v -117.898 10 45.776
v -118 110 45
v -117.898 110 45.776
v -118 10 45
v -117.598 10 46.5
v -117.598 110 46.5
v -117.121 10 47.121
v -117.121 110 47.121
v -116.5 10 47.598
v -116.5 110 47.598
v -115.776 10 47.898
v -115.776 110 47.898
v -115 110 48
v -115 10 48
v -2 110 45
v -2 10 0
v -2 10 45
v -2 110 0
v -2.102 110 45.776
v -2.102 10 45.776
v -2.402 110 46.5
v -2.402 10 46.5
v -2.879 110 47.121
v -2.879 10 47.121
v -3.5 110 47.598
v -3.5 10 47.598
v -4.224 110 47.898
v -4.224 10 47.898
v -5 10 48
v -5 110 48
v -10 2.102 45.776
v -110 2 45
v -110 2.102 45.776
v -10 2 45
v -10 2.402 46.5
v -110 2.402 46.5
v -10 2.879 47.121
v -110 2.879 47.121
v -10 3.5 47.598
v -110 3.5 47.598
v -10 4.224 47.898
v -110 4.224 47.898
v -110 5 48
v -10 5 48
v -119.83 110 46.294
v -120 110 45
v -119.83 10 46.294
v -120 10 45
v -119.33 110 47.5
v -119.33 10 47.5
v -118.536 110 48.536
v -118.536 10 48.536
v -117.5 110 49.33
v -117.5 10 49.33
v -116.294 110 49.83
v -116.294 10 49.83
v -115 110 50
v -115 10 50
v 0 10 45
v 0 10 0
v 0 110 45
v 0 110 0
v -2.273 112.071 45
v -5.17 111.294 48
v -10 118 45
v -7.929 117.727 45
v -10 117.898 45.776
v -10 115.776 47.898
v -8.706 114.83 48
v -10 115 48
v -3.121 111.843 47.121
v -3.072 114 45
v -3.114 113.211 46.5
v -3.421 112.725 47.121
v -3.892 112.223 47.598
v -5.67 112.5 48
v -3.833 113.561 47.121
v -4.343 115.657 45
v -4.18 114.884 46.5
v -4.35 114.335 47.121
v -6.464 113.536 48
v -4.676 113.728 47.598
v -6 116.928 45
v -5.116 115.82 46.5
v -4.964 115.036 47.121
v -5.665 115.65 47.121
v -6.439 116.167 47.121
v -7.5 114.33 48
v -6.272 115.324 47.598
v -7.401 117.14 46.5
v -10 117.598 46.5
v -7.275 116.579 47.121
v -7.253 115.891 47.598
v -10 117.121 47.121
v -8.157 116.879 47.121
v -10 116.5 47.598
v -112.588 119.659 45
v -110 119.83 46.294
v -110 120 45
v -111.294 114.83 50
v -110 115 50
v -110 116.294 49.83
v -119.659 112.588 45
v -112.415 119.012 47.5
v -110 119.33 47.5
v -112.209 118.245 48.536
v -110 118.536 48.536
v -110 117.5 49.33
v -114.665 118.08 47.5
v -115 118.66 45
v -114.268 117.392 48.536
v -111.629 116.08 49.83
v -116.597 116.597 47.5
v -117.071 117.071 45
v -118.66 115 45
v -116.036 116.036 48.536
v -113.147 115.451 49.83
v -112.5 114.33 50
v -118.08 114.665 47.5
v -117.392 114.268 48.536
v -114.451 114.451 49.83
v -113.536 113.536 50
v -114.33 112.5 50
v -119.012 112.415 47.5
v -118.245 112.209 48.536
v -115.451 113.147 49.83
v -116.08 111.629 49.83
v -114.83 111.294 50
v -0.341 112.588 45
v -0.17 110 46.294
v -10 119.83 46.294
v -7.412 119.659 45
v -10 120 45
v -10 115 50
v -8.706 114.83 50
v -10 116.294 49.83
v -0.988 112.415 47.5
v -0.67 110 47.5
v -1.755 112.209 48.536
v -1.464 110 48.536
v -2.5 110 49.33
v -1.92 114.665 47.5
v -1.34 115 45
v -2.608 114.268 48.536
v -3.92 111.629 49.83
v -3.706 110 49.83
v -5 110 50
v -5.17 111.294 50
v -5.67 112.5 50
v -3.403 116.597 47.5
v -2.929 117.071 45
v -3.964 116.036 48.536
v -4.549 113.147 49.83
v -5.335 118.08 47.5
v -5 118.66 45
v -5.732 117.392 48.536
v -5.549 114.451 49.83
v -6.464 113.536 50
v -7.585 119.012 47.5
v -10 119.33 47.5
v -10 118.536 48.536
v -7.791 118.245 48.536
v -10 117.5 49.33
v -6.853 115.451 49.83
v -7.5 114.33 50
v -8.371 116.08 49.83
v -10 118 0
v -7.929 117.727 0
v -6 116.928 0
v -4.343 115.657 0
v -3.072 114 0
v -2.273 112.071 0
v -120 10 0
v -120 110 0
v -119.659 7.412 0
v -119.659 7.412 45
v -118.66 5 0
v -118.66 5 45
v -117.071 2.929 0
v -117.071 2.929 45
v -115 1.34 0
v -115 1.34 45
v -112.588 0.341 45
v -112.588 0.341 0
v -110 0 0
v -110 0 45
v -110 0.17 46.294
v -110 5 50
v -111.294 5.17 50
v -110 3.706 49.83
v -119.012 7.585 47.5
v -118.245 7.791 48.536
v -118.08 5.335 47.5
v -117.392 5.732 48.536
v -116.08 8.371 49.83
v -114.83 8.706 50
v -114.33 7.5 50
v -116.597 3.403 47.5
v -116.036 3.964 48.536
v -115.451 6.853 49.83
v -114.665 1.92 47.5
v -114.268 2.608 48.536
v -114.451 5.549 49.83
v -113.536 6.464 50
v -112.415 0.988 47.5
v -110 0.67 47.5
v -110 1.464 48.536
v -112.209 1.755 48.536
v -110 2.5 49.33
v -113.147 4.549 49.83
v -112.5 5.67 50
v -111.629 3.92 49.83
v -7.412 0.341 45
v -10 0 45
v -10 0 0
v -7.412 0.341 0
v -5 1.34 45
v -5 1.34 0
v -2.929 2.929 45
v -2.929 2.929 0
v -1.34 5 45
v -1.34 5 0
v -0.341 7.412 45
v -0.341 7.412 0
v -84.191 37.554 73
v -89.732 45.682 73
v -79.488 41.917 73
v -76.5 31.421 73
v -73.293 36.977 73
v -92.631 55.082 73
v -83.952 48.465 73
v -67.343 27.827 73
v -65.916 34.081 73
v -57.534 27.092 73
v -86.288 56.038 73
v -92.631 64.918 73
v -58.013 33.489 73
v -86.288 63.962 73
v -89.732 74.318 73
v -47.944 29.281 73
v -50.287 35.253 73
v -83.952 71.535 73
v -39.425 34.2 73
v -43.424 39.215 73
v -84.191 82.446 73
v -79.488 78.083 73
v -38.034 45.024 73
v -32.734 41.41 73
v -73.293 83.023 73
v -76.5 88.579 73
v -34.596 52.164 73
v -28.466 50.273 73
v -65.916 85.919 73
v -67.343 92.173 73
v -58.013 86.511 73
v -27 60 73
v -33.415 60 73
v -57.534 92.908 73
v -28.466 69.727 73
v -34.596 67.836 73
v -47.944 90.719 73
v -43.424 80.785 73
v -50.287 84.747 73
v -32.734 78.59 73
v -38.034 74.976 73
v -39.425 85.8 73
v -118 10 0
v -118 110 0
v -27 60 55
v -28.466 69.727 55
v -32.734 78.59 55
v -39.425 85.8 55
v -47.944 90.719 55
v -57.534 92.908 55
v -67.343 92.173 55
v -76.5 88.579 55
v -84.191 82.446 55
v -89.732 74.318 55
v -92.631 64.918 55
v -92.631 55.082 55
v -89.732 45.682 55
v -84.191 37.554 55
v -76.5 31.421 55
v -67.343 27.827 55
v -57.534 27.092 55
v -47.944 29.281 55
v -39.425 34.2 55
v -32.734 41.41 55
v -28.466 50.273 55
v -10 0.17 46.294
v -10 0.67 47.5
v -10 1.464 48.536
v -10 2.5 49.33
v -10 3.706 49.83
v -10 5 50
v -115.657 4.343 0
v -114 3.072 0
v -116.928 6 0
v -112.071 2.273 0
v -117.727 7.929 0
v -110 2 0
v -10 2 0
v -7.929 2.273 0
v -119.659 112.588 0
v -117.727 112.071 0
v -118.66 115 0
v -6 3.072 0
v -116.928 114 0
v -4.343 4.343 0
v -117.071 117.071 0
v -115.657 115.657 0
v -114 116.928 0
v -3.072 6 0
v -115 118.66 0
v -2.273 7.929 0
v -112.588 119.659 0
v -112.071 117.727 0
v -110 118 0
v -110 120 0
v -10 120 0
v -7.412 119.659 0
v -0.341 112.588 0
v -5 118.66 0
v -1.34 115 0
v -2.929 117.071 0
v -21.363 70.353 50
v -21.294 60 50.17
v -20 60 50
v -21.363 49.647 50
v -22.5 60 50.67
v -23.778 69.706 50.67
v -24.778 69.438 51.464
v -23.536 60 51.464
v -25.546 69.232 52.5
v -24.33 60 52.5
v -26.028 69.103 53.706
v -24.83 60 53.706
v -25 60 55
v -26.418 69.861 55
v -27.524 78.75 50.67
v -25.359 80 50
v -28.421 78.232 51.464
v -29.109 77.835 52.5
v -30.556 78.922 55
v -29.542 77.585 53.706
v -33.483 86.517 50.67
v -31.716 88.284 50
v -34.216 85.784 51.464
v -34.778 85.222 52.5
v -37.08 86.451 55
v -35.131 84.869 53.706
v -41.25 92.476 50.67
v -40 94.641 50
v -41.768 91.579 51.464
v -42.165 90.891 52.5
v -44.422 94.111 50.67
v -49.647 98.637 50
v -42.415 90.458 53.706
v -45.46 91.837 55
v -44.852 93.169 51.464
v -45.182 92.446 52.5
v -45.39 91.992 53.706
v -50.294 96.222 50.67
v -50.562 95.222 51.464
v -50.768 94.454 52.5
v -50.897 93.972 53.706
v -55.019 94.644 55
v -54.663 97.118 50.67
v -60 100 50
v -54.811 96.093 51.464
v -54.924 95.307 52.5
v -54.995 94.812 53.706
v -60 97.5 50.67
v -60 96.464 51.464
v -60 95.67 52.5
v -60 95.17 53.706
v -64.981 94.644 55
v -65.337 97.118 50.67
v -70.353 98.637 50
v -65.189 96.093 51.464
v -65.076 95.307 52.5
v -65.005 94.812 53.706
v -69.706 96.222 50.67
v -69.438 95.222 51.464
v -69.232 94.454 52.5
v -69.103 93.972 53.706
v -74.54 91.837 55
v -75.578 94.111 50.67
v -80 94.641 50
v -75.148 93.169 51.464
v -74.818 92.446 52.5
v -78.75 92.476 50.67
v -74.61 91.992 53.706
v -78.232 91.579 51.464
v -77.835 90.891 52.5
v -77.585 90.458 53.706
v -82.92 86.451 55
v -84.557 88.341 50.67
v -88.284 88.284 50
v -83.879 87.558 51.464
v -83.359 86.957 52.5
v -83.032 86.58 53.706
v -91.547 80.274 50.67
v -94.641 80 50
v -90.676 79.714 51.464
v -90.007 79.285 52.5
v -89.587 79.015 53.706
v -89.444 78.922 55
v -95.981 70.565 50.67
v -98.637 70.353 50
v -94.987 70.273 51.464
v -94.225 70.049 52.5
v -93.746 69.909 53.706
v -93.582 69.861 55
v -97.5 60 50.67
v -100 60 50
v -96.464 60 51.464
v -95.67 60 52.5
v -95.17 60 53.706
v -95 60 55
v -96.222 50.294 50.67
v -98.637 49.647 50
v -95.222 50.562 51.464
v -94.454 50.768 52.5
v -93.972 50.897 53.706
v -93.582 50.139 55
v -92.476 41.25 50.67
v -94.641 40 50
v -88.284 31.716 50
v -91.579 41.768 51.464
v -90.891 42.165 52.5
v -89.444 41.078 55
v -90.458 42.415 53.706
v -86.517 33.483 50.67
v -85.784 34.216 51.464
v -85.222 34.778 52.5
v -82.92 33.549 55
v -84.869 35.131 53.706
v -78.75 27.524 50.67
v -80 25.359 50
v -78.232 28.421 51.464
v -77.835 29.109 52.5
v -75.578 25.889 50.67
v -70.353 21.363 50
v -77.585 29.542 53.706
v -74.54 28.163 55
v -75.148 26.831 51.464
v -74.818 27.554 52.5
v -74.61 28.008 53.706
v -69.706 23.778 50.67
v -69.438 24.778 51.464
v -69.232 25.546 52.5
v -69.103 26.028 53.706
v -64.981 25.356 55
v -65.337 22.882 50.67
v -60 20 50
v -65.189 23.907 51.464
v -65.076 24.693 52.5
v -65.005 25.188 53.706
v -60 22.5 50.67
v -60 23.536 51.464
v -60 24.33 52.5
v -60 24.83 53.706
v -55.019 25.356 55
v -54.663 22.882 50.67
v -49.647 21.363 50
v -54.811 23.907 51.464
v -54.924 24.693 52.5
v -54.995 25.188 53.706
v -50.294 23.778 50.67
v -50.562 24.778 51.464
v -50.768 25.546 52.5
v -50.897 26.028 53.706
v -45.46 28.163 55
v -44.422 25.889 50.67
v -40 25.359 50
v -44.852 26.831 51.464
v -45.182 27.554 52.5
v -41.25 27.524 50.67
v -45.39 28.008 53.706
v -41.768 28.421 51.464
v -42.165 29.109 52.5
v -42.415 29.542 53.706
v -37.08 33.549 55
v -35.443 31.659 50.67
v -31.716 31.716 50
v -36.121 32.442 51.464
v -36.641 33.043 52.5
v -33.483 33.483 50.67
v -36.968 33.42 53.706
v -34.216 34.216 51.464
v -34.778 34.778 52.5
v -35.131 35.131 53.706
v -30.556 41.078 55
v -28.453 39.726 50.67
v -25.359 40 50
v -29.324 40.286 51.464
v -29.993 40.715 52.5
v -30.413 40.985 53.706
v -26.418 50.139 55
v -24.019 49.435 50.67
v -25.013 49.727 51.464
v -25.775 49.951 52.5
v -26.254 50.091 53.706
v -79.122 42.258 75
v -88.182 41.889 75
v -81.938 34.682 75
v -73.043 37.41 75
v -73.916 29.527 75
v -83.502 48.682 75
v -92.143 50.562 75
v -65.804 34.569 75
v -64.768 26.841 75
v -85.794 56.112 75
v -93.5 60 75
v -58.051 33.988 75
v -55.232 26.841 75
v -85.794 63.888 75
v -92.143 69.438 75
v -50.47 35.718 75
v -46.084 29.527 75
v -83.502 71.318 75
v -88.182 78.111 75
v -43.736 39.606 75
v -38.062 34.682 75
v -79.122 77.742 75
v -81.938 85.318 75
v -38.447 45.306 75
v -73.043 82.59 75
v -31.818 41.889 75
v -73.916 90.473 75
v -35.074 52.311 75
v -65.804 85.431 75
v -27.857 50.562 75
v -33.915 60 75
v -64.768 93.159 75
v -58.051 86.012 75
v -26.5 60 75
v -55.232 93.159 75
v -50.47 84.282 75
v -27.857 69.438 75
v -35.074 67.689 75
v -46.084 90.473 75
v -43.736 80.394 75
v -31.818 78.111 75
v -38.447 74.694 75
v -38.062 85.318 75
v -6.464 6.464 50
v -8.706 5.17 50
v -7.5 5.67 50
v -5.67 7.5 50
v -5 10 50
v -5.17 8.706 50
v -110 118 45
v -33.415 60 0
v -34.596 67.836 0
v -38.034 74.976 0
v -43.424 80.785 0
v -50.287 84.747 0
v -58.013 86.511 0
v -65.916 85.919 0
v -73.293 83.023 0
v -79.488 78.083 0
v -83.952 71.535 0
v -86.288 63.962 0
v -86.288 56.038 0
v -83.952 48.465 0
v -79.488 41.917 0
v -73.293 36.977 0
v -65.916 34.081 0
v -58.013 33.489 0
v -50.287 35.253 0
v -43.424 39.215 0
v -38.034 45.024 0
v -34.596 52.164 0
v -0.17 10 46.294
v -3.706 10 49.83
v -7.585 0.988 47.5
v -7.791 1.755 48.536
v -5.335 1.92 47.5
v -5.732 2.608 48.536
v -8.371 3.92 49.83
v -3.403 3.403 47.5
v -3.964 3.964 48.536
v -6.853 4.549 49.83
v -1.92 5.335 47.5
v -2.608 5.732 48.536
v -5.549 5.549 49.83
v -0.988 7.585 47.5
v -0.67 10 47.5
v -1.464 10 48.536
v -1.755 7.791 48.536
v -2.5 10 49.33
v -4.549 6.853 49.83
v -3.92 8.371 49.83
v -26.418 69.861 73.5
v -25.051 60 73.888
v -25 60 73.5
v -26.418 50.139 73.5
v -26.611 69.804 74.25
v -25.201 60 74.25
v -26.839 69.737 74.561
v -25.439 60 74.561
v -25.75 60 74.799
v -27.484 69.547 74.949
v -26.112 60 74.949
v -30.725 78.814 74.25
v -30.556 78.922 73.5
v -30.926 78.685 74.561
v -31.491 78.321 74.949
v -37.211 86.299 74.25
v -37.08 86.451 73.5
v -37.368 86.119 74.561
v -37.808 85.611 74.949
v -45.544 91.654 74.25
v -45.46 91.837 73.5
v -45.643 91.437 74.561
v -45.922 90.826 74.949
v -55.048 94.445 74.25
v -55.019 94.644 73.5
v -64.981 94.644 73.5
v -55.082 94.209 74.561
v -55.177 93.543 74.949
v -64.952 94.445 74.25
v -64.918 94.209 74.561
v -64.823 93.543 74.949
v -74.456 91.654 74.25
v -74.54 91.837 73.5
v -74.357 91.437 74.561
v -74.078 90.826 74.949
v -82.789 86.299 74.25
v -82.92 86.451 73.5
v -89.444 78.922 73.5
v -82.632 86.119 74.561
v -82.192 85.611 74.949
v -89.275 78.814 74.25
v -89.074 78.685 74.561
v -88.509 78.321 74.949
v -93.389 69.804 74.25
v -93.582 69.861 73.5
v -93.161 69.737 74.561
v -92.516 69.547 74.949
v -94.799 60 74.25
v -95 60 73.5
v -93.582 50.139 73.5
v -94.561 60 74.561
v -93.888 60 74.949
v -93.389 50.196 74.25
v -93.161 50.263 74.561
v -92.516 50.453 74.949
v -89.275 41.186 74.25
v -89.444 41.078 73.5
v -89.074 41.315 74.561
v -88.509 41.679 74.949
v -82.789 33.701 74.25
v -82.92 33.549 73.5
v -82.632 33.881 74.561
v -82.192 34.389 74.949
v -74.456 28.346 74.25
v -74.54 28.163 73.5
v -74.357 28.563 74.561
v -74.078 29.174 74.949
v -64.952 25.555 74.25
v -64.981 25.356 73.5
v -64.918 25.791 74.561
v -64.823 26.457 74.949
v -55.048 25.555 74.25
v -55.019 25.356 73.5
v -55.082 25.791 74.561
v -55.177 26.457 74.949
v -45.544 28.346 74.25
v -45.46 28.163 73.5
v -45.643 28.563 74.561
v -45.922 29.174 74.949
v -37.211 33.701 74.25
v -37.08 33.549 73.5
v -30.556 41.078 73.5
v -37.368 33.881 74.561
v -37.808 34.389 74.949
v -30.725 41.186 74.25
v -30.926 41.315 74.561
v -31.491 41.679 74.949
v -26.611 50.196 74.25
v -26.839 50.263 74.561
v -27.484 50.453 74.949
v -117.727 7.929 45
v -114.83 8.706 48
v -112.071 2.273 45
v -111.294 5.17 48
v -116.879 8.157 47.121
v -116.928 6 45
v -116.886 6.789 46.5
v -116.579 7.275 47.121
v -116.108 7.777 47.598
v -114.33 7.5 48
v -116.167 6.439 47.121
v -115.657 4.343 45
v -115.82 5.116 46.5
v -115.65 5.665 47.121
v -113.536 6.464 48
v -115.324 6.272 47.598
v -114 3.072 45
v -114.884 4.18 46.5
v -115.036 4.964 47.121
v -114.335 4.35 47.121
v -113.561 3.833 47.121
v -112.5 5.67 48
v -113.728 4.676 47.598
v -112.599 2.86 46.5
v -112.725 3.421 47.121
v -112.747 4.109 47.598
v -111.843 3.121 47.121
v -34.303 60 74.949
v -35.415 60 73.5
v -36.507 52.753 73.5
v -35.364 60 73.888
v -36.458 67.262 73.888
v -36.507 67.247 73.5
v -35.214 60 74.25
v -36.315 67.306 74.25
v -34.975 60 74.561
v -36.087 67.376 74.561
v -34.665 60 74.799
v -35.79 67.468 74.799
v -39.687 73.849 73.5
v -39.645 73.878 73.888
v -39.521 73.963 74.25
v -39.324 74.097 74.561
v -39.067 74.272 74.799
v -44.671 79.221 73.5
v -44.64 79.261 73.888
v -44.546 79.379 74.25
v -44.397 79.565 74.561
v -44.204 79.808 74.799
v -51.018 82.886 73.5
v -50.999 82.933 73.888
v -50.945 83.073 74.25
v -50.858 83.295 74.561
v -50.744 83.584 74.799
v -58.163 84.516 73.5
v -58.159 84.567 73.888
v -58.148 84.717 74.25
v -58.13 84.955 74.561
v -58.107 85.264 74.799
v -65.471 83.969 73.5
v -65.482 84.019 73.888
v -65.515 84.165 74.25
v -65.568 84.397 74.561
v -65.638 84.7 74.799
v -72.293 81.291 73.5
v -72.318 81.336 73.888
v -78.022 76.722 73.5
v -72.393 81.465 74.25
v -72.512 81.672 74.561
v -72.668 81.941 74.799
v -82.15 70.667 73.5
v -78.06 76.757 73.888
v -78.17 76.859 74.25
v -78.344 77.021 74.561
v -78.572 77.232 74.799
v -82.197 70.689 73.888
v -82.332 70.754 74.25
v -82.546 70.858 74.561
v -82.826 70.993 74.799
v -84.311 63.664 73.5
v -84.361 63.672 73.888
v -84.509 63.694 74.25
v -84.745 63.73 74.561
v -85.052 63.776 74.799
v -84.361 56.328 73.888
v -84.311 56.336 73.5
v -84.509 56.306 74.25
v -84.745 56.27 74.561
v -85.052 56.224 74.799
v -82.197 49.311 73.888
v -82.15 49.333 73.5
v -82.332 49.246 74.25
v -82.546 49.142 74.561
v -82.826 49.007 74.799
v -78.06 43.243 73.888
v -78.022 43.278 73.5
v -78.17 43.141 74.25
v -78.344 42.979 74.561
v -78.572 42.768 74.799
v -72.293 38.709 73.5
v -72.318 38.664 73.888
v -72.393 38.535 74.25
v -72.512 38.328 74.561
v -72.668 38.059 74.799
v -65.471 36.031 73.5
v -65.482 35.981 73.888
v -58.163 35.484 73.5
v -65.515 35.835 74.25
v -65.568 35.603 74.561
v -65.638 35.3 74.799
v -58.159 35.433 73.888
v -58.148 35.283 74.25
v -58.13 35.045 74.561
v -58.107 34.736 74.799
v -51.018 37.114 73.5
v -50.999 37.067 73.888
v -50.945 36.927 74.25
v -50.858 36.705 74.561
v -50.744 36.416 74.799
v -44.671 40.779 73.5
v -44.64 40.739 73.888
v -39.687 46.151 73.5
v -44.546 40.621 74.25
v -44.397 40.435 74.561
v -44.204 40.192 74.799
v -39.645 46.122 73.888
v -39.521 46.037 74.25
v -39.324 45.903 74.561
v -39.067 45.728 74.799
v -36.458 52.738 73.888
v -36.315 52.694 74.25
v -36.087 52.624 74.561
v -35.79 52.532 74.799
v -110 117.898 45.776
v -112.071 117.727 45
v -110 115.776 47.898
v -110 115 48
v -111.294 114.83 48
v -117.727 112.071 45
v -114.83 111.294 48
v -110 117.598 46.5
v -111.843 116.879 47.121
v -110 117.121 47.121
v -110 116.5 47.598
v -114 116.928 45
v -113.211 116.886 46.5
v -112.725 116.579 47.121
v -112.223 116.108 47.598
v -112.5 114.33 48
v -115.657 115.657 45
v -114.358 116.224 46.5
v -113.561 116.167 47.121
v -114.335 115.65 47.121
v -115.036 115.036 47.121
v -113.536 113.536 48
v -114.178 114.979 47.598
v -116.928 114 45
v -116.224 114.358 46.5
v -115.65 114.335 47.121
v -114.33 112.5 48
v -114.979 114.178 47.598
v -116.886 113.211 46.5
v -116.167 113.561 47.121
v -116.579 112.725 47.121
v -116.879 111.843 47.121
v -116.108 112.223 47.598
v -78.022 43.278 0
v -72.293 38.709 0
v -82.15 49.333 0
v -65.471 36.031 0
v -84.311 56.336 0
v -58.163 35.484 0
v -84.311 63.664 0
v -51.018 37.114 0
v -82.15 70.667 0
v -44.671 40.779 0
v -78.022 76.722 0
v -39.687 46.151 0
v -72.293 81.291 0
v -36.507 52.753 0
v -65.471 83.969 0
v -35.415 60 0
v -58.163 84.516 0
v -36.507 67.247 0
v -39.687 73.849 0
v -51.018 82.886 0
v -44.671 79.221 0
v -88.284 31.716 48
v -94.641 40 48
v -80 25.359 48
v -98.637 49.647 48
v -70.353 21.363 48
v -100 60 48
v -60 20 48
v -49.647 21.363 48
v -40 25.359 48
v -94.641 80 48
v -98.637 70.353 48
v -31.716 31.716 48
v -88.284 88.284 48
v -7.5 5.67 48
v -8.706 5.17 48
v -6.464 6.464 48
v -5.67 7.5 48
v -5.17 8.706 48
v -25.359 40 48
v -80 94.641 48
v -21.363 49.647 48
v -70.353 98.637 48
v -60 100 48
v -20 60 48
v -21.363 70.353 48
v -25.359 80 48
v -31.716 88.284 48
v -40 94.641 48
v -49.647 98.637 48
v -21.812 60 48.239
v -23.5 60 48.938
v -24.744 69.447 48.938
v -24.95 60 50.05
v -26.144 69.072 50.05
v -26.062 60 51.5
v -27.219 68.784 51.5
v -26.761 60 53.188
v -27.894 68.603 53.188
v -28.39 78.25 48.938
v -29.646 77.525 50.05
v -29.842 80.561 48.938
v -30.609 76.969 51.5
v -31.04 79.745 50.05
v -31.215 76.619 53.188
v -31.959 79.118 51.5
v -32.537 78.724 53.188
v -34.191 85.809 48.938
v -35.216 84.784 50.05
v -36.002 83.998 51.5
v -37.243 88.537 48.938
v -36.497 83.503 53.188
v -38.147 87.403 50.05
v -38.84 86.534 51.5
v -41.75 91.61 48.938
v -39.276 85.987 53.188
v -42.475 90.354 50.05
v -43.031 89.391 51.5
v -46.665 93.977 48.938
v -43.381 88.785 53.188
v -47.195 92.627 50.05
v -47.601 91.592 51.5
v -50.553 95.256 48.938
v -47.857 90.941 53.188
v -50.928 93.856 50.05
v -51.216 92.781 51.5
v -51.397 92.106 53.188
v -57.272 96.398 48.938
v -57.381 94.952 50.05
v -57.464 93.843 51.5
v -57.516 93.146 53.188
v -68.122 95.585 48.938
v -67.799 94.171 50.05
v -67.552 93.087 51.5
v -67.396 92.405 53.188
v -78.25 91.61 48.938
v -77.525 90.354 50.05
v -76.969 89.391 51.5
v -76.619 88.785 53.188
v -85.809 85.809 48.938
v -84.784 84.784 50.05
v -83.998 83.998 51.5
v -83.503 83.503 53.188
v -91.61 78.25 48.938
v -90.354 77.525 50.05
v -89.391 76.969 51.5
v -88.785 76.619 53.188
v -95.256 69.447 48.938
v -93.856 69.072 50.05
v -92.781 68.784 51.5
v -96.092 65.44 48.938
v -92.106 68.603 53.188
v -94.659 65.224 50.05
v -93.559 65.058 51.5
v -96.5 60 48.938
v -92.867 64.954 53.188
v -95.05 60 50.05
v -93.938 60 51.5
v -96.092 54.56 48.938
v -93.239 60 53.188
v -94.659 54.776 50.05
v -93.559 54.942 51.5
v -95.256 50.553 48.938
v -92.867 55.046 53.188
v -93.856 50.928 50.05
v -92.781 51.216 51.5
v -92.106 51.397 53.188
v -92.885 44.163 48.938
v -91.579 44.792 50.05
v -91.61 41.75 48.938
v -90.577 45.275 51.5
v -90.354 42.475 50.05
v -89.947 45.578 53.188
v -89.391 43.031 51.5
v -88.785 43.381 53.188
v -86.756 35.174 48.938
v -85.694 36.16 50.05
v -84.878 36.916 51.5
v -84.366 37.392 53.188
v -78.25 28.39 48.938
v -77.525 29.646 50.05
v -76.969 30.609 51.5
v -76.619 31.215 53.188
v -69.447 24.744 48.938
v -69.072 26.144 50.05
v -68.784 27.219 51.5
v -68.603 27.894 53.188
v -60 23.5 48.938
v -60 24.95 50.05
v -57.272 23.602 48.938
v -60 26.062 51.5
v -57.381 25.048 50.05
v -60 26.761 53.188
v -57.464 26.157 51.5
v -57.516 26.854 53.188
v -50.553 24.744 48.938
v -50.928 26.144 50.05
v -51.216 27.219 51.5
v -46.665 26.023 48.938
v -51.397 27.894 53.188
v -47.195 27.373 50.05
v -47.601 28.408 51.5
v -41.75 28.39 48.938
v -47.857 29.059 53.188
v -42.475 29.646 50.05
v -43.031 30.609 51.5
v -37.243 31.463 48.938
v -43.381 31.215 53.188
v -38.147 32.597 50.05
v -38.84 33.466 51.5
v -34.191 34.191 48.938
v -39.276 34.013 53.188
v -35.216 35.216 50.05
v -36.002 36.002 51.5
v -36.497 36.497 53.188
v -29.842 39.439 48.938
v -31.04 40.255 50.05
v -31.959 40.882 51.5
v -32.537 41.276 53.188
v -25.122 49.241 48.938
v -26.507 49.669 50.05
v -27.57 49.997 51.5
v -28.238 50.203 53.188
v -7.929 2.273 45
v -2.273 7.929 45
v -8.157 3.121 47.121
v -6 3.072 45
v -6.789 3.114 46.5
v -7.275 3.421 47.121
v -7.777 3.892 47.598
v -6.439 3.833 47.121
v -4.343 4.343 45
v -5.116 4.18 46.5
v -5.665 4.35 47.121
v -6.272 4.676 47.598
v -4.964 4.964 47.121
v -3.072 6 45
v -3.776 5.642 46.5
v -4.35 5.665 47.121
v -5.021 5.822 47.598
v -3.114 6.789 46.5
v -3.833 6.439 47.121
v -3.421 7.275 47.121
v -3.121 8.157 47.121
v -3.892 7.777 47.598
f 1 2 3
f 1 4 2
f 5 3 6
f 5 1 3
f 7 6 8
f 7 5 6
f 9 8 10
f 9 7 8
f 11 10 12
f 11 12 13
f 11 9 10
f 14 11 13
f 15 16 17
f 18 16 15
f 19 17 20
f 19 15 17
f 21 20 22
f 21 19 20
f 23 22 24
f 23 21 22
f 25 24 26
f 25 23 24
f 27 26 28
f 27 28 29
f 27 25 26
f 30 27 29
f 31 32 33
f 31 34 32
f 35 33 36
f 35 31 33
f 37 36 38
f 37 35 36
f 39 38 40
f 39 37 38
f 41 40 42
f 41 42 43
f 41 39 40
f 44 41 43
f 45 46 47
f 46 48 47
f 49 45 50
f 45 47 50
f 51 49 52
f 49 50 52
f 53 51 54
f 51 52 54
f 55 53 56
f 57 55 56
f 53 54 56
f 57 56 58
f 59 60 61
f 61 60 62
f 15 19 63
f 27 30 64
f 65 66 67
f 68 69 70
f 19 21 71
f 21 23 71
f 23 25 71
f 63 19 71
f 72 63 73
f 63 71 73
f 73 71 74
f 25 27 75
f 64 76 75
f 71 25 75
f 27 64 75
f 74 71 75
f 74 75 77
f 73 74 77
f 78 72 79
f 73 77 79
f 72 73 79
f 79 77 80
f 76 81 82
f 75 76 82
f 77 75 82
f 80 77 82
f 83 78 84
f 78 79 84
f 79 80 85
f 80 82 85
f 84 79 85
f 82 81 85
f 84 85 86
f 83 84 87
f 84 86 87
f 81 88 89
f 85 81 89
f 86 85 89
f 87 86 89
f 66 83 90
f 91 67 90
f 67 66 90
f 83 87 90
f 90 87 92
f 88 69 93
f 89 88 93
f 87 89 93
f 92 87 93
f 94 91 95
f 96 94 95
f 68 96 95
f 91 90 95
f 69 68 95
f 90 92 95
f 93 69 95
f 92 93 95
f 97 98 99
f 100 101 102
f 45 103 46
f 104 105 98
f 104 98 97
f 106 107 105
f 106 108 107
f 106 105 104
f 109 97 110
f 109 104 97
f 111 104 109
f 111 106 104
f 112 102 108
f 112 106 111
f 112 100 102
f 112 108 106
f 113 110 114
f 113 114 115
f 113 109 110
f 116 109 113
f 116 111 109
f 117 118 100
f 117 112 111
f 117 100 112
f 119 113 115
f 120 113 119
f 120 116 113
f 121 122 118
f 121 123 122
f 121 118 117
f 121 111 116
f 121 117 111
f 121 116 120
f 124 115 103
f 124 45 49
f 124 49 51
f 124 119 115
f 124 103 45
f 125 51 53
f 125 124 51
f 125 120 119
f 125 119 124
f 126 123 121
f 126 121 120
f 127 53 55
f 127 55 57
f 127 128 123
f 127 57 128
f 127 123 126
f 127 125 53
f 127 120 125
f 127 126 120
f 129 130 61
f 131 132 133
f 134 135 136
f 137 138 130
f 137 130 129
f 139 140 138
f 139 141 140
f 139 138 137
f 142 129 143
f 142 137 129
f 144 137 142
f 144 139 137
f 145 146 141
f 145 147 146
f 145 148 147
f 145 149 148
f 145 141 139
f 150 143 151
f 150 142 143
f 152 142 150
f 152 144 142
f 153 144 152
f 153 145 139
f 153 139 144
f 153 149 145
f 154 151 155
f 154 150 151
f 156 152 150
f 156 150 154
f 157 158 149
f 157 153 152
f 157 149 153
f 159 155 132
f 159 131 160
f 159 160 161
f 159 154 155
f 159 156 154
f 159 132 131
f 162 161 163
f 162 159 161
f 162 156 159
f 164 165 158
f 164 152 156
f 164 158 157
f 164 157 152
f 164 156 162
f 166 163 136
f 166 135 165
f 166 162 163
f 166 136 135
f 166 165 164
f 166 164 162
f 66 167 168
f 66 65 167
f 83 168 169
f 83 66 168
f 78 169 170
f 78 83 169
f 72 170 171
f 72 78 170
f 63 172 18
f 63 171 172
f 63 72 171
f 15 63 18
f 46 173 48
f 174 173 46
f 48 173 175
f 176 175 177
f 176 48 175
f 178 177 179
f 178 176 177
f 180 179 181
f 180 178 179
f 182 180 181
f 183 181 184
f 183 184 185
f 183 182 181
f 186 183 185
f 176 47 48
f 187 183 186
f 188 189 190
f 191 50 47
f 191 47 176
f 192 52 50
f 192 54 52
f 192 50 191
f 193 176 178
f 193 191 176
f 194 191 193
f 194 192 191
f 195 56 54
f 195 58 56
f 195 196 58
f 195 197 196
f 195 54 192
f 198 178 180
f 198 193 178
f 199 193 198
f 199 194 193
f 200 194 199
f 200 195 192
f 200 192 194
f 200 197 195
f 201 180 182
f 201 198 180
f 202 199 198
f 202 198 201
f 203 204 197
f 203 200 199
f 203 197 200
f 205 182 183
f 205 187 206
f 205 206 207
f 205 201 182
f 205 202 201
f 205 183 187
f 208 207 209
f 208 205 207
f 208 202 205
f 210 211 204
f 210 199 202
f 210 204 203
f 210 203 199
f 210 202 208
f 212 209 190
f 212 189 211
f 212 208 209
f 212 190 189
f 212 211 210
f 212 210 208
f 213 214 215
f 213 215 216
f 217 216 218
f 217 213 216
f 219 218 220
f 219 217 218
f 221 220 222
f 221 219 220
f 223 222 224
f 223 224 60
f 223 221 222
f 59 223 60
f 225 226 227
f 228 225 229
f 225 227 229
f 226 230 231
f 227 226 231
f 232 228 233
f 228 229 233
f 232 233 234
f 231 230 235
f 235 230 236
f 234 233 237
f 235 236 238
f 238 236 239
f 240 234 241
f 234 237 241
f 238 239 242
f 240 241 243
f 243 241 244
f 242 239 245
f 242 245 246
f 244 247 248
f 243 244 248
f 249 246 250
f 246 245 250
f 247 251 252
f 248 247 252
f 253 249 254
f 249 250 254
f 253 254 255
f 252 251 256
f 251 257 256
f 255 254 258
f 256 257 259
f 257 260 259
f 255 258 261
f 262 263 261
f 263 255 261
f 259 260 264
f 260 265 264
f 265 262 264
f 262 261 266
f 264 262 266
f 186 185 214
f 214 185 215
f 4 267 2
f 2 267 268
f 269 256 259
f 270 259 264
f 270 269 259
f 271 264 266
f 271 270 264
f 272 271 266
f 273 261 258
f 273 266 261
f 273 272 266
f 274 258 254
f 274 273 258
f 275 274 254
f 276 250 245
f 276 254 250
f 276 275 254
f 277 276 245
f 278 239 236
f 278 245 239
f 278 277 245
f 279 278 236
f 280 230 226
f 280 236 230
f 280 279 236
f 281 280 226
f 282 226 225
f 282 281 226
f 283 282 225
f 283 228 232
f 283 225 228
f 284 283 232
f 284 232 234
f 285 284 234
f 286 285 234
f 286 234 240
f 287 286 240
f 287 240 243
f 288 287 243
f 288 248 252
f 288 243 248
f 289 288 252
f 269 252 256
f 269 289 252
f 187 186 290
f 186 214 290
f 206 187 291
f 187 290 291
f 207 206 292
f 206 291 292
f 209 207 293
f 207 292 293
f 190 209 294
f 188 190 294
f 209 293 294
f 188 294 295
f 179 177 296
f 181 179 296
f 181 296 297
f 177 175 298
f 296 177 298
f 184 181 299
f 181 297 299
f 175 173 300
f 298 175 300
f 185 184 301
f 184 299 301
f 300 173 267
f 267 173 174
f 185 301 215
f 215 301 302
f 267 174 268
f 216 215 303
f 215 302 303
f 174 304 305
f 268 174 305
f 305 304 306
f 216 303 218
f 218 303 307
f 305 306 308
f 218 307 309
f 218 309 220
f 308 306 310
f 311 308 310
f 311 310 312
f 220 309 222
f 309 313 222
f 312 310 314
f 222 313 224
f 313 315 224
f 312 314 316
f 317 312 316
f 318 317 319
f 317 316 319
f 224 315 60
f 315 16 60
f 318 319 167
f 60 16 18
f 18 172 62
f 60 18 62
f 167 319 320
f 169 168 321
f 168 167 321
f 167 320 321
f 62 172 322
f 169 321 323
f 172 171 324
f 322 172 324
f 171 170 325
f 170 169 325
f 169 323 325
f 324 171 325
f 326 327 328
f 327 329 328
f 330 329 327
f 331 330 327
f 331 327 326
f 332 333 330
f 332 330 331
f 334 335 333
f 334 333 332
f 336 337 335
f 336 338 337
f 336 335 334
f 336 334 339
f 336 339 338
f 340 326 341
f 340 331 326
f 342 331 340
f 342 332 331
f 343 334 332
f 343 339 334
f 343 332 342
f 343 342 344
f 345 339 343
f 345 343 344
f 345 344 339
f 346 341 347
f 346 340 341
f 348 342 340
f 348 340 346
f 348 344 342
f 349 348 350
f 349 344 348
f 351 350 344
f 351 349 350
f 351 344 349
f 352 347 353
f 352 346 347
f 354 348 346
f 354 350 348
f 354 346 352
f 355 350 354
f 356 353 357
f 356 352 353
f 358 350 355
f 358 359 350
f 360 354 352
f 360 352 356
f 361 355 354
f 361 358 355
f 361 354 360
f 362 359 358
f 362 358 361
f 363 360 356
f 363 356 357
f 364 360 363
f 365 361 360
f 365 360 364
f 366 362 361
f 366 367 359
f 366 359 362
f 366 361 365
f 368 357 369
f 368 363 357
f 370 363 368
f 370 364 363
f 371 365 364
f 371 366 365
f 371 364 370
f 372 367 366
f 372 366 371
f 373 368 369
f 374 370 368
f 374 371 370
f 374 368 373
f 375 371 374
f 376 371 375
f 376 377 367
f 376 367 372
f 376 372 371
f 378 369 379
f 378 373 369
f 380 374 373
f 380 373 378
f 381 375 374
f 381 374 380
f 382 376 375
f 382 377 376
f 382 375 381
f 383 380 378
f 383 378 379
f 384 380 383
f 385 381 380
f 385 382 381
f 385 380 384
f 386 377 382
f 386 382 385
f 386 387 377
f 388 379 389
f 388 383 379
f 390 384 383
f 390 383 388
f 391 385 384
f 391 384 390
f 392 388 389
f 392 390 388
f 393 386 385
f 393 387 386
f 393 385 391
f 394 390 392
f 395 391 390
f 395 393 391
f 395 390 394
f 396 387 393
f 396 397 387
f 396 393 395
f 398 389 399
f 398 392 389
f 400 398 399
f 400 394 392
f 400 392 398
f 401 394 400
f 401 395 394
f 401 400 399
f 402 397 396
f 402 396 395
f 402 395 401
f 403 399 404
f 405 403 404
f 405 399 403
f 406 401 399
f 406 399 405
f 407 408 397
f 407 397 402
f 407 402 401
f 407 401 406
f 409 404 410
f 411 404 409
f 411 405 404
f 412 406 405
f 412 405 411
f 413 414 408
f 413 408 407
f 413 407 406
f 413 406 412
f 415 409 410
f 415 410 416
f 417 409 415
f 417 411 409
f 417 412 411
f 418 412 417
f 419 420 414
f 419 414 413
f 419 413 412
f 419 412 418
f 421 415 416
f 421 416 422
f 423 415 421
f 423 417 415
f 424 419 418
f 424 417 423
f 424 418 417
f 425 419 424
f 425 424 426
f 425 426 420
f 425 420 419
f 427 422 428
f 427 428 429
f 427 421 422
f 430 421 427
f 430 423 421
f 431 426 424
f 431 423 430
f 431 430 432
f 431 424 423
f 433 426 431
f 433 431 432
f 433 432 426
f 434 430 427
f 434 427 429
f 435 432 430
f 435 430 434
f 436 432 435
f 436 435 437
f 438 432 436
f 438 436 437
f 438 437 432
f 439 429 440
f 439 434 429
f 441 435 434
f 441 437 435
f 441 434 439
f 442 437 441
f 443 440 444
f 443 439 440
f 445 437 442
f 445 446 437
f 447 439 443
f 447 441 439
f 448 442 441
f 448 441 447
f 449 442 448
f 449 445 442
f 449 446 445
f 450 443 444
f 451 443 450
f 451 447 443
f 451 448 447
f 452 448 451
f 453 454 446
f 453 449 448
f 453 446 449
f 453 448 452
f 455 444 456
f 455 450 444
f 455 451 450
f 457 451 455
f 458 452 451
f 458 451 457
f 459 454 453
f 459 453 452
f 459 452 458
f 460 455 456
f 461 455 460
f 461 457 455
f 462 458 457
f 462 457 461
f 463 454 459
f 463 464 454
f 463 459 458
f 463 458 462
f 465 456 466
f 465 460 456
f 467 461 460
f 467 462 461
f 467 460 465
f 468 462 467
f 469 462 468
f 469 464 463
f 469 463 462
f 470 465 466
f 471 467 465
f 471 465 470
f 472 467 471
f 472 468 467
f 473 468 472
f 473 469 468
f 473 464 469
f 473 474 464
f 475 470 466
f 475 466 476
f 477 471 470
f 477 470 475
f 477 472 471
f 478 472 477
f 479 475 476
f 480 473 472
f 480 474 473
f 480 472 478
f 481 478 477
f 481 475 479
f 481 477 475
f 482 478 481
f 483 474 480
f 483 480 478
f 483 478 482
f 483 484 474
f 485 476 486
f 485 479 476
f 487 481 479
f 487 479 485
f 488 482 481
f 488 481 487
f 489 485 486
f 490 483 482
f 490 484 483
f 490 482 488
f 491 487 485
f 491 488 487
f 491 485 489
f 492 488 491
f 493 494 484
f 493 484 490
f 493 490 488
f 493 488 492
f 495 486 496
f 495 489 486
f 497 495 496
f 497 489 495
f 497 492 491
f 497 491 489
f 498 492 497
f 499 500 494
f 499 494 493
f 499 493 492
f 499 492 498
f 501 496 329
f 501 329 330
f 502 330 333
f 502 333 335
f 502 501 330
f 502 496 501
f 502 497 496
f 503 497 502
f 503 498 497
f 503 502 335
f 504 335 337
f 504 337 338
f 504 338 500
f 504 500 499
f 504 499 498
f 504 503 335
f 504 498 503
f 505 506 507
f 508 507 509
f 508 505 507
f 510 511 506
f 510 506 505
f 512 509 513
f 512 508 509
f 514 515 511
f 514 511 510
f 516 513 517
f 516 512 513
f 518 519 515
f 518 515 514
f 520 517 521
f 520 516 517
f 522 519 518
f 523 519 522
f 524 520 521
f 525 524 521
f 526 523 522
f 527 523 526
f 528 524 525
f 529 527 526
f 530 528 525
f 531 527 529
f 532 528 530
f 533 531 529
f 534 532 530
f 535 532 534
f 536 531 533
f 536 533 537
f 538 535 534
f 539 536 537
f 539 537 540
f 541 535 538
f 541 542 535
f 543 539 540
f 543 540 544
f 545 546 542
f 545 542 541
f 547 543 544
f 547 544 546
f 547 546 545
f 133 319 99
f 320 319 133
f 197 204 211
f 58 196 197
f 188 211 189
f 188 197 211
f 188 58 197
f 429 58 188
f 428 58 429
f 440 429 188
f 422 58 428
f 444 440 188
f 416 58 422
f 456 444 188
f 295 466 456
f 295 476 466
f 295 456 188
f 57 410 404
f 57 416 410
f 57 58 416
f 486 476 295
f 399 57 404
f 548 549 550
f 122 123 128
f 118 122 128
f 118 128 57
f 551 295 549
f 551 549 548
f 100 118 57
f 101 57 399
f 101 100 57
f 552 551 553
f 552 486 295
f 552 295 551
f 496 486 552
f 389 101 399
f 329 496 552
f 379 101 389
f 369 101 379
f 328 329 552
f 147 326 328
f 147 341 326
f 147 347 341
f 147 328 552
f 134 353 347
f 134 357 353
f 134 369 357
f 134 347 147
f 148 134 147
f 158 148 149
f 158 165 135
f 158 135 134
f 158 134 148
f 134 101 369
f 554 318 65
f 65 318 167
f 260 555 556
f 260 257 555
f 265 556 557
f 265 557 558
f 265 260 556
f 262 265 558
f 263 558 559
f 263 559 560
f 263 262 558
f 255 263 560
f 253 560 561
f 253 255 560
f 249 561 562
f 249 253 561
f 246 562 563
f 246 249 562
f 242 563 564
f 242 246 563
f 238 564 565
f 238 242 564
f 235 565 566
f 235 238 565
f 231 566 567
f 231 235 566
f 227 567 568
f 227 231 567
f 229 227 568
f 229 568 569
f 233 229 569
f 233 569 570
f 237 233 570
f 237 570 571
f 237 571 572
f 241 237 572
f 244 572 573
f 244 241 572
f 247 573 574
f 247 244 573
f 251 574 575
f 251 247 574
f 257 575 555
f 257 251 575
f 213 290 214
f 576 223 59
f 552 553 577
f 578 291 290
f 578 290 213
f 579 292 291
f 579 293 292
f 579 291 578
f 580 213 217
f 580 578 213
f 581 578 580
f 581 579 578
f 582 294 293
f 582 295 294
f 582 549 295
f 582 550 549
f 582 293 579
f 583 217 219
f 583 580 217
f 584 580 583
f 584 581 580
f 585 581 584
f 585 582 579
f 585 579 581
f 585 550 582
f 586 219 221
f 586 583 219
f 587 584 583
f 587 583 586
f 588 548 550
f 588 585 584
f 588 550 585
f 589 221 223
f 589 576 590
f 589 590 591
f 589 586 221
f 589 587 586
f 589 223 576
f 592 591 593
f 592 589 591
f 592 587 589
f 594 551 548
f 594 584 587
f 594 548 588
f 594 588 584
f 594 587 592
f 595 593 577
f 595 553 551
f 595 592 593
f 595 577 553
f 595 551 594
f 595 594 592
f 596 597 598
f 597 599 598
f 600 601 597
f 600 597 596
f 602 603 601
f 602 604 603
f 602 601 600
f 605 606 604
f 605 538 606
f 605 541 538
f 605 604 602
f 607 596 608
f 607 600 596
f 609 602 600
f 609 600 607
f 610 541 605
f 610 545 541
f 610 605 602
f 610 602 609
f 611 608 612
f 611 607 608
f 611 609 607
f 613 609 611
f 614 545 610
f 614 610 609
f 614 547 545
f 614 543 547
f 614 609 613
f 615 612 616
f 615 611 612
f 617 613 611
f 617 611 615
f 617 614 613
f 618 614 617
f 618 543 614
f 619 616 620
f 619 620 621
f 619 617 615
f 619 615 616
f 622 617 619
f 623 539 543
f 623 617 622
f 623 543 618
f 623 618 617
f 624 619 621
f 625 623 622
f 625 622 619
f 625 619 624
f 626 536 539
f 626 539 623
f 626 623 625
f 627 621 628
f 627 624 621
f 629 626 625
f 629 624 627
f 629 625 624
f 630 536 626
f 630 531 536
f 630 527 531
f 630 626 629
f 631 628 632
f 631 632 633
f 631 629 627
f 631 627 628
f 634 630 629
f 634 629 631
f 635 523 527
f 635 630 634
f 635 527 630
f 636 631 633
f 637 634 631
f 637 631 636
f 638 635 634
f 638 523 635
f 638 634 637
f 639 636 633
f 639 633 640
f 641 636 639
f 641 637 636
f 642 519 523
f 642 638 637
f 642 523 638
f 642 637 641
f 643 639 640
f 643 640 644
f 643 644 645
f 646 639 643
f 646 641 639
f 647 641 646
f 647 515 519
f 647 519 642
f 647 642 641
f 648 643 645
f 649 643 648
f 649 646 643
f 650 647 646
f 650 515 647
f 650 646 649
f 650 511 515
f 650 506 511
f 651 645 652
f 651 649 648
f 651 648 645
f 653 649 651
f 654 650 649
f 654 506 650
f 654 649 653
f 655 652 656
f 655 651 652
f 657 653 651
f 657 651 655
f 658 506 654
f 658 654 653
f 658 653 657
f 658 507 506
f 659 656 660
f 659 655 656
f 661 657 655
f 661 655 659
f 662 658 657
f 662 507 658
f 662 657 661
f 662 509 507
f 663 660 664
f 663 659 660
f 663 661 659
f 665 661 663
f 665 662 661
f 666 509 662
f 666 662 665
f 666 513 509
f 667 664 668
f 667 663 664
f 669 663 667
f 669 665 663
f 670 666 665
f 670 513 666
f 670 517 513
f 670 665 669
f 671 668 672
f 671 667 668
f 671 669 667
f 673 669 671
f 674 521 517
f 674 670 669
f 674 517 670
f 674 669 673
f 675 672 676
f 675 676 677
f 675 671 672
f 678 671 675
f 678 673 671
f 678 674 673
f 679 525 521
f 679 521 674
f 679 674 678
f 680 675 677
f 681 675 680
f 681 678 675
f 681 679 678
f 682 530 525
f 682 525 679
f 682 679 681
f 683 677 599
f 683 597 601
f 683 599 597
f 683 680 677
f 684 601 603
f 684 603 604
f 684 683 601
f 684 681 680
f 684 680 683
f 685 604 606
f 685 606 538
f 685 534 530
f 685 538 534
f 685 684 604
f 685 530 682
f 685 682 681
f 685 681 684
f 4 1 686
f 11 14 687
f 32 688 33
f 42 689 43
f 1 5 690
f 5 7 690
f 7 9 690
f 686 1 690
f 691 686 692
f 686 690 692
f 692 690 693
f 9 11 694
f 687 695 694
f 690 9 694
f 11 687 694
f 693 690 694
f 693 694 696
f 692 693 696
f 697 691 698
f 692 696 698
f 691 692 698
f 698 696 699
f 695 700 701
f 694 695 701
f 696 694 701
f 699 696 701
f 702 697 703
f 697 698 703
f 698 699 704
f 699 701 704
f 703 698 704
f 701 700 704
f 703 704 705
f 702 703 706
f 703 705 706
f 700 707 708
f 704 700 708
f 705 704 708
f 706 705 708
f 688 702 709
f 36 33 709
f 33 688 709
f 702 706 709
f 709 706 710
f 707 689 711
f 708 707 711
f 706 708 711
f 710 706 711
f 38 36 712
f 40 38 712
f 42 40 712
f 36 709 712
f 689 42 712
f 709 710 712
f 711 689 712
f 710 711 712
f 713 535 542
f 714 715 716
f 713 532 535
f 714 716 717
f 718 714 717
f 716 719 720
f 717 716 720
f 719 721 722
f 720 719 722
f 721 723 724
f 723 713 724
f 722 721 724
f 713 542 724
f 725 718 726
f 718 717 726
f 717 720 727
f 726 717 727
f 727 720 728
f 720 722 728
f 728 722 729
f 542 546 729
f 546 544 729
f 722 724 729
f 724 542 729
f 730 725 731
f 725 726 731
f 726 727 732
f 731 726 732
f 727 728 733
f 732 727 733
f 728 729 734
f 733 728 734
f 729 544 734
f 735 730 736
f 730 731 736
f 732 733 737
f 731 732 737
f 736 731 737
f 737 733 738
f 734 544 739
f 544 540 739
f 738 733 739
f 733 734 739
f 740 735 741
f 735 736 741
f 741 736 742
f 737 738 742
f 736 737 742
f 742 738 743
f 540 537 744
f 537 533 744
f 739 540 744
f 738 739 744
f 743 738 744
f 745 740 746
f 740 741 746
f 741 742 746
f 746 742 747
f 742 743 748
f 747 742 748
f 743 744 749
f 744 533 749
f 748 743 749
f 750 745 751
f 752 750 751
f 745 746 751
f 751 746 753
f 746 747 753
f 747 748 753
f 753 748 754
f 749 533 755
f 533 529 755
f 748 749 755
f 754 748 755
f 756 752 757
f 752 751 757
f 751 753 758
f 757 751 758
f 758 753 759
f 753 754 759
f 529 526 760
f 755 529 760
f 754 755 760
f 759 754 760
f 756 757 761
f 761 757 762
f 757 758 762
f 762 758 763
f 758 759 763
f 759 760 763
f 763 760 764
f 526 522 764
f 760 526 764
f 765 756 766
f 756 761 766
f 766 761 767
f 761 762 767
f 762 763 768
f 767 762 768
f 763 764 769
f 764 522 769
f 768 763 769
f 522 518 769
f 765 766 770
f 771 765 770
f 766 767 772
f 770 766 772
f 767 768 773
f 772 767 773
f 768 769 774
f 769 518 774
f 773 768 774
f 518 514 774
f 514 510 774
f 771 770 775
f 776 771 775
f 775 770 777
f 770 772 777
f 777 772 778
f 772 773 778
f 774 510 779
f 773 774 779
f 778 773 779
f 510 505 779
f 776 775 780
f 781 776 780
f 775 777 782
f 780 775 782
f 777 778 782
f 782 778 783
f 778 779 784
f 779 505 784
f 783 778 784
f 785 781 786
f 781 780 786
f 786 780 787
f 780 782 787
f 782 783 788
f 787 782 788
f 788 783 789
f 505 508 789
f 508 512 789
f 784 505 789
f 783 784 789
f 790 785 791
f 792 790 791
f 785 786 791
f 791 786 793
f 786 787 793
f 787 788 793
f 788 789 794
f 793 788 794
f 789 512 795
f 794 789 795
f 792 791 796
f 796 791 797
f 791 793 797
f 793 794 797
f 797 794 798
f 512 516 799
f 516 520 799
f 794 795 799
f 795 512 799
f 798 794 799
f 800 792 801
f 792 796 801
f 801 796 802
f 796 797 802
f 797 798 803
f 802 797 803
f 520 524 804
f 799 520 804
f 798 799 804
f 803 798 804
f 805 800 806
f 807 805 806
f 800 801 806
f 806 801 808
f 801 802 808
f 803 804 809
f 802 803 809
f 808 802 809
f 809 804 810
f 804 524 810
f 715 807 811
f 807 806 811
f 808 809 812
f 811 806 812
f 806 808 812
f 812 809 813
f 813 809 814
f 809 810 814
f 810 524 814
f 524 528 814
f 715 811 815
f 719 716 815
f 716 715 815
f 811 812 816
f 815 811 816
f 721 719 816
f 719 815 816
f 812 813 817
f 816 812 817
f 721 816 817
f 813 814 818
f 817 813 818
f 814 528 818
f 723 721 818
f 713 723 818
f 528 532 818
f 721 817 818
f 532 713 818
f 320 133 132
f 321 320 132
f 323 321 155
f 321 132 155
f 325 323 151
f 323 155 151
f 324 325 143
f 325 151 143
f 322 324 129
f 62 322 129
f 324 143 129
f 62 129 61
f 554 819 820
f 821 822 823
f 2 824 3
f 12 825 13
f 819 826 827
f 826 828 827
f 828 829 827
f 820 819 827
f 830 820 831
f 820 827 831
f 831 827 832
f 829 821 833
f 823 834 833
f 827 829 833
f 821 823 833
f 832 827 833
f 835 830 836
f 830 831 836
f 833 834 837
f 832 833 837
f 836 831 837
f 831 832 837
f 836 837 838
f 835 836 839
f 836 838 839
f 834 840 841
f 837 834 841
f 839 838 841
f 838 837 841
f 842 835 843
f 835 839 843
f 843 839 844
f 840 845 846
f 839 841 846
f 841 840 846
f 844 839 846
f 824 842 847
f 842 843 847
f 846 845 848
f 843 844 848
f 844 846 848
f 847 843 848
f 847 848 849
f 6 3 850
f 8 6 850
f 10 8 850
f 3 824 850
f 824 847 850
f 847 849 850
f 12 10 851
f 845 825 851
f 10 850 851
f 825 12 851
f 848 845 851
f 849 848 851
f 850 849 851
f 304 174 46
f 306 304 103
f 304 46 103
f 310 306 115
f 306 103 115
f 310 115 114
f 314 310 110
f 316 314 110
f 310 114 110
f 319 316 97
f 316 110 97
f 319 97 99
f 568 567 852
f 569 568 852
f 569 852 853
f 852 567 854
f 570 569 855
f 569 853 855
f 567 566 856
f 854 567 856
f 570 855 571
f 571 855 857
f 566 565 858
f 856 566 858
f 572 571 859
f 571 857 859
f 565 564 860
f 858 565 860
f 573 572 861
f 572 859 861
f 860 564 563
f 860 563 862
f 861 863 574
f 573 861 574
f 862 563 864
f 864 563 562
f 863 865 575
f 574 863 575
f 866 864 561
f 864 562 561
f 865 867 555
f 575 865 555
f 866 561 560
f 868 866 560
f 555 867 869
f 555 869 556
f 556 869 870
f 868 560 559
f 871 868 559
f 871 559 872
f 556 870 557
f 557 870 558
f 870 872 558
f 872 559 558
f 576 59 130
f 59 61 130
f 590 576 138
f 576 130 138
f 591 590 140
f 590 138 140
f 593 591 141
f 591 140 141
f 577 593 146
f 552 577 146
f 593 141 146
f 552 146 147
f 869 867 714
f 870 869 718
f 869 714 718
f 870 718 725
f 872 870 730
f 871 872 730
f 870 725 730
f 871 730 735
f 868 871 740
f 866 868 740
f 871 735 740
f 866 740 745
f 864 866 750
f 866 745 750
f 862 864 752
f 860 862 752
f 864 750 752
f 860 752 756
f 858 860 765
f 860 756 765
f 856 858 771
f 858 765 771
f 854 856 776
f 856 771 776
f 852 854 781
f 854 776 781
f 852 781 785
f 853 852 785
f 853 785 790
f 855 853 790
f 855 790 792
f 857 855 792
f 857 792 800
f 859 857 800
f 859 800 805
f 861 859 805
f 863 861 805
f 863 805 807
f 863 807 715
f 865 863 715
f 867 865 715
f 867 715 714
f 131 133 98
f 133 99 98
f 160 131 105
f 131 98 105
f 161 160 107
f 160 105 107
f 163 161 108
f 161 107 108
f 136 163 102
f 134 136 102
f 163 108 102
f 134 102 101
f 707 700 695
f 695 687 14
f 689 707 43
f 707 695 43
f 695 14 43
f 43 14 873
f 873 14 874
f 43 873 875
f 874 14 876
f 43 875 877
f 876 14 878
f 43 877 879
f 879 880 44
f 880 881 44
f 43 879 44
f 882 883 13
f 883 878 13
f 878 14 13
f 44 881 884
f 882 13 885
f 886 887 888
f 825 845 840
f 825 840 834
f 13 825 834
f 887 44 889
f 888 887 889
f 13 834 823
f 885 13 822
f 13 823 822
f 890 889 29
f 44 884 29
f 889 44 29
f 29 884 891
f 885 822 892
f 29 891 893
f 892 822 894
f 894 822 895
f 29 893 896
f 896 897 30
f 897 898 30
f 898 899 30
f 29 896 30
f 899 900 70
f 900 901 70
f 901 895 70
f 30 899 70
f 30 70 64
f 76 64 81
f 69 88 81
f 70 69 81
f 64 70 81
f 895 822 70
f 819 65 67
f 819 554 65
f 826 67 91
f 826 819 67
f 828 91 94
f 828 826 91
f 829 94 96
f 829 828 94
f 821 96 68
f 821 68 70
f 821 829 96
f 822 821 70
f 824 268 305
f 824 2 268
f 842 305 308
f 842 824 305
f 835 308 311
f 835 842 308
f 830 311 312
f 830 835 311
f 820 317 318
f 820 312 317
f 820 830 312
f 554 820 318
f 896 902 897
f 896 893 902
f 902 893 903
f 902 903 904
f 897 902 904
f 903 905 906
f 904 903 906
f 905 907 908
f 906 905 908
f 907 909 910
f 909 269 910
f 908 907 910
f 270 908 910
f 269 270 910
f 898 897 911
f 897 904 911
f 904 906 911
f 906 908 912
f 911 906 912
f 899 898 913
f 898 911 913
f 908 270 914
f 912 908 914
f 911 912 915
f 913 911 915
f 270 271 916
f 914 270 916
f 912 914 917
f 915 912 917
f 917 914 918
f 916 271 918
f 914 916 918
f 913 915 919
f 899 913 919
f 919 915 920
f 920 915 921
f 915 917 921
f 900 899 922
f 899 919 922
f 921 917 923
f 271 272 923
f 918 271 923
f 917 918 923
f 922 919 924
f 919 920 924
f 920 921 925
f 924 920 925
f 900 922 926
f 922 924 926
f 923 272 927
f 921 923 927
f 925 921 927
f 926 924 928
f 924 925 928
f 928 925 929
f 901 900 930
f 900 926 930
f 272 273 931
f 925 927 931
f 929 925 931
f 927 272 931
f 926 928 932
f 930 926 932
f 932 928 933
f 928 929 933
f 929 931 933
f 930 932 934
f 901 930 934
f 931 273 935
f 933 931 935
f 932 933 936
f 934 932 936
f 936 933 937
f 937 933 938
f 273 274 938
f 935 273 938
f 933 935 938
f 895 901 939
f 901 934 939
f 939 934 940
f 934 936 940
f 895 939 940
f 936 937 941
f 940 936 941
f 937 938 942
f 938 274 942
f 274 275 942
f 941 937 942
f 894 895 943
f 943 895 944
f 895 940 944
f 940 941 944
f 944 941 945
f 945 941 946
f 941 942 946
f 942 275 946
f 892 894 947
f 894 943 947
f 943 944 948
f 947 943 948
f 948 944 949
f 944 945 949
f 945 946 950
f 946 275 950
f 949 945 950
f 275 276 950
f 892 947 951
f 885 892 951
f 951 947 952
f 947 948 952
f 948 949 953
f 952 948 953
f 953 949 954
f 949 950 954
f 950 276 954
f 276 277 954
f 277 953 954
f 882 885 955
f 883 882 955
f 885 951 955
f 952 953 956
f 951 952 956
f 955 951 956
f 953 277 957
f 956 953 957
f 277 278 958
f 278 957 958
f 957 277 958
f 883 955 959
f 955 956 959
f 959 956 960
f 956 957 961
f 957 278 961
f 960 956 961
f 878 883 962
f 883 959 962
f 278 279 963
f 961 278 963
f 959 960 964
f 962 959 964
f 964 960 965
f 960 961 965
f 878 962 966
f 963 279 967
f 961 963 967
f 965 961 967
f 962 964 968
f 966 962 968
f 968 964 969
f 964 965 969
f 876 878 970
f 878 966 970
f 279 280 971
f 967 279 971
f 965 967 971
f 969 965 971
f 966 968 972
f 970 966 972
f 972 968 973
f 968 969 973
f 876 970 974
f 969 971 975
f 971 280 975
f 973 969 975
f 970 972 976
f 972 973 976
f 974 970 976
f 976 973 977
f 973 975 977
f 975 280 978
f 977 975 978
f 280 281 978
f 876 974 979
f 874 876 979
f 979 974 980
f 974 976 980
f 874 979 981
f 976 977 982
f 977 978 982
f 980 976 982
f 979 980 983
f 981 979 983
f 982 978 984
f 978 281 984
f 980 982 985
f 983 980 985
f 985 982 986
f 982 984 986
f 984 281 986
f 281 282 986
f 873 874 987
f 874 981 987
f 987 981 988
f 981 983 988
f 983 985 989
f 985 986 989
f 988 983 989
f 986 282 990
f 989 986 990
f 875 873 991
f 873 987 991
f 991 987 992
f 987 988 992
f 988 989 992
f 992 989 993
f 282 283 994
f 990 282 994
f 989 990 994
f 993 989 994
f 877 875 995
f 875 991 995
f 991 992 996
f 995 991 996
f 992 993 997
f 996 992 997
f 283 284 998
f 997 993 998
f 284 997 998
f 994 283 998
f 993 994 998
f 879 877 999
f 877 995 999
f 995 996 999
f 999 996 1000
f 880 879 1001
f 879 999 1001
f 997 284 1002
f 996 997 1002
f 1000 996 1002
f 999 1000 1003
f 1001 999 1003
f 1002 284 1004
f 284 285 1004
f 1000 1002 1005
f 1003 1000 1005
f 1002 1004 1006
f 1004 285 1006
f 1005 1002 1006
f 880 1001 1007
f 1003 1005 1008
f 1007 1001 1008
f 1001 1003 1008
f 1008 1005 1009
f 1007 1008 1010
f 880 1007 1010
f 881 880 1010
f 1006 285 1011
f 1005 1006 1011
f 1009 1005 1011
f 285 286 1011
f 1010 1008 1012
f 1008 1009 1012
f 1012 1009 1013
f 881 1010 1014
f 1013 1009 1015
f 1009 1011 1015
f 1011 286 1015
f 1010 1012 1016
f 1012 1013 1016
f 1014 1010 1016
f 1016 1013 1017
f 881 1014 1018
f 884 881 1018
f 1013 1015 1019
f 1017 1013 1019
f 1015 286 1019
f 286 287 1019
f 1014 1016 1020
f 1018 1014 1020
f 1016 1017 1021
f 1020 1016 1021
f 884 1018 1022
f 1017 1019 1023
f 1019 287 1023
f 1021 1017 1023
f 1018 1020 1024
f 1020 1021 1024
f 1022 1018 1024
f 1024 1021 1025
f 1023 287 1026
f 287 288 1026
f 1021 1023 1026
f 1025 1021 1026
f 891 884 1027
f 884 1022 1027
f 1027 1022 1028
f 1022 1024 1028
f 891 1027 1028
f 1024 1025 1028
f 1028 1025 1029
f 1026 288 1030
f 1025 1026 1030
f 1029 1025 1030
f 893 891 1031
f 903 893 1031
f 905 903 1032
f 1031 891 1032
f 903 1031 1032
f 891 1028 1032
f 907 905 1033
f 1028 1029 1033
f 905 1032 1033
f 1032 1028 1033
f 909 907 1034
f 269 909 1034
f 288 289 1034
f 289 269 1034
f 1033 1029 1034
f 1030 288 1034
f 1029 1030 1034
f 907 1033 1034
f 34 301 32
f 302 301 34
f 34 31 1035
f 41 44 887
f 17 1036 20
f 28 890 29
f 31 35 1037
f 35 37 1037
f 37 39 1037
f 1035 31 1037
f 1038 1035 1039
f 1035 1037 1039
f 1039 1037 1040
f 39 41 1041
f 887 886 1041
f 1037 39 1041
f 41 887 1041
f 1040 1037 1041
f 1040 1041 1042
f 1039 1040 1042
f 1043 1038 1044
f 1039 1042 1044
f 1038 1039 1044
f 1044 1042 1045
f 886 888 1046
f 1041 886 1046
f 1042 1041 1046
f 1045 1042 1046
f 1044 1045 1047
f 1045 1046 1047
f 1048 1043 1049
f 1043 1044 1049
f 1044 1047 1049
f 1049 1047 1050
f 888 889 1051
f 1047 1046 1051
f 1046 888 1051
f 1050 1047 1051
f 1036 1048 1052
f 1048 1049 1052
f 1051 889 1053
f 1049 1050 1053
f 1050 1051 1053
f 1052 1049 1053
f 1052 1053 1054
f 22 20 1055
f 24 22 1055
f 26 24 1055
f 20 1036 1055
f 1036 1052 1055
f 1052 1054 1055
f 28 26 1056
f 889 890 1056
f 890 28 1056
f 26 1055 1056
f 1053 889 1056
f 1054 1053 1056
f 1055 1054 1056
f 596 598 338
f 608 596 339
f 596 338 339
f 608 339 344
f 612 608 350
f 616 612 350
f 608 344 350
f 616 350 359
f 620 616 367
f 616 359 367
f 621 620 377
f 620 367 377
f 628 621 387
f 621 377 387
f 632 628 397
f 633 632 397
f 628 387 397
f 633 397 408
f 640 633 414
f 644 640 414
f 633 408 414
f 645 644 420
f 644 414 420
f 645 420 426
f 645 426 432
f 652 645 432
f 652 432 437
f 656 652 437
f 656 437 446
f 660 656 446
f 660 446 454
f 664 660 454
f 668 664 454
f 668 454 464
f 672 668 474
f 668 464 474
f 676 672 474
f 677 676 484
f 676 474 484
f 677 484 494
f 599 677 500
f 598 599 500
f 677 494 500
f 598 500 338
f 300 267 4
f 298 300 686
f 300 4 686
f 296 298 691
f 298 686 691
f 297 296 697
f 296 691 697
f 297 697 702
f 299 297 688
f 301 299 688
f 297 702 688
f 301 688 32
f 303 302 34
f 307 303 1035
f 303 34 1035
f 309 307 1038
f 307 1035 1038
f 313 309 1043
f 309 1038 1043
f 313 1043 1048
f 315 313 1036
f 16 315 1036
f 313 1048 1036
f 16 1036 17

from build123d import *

# Parameters (mm, degrees)
SKETCH1_W           = 120
SKETCH1_H           = 120
BOSS_EXTRUDE1_DEPTH = 50
SKETCH3_R           = 35
BOSS_EXTRUDE2_DEPTH = 25
SKETCH8_R           = 24.585181497
CUT_EXTRUDE1_DEPTH  = 186.539753153
FILLET1_R           = 10
FILLET2_R           = 1.5
FILLET3_R           = 5
SHELL1_T            = -2


with BuildPart() as part:
    # Sketch1 → Boss-Extrude1 (new body)
    with BuildSketch(Plane.XY):
        with Locations((-60, 60)):
            Rectangle(SKETCH1_W, SKETCH1_H)
    extrude(amount=BOSS_EXTRUDE1_DEPTH)

    # Sketch3 → Boss-Extrude2 (add)
    with BuildSketch(Plane.XY.offset(50)):
        with Locations((-60, 60)):
            Circle(SKETCH3_R)
    extrude(amount=BOSS_EXTRUDE2_DEPTH)

    # Sketch8 → Cut-Extrude1 (cut, through all)
    with BuildSketch(Plane.XY.offset(75)):
        with Locations((-60, 60)):
            Circle(SKETCH8_R)
    extrude(amount=-CUT_EXTRUDE1_DEPTH, mode=Mode.SUBTRACT)

    # Fillet1
    fillet1_edges = [part.edges().sort_by_distance(p)[0] for p in [
        (0, 0, 25),
        (-120, 0, 25),
        (-120, 120, 25),
        (0, 120, 25),
    ]]
    fillet(fillet1_edges, radius=FILLET1_R)

    # Fillet2
    fillet2_edges = [part.edges().sort_by_distance(p)[0] for p in [
        (-95, 60, 75),
        (-84.585181497, 60, 75),
    ]]
    fillet(fillet2_edges, radius=FILLET2_R)

    # Fillet3
    fillet3_edges = [part.edges().sort_by_distance(p)[0] for p in [
        (-95, 60, 50),
        (-60, 0, 50),
        (-120, 60, 50),
        (0, 60, 50),
        (-60, 120, 50),
        (-2.928932188, 117.071067812, 50),
        (-117.071067812, 117.071067812, 50),
        (-2.928932188, 2.928932188, 50),
        (-117.071067812, 2.928932188, 50),
    ]]
    fillet(fillet3_edges, radius=FILLET3_R)

    # Shell1
    shell1_openings = [part.faces().sort_by_distance(p)[0] for p in [
        (-60, 1.697056275, 0),
    ]]
    offset(amount=SHELL1_T, openings=shell1_openings, kind=Kind.INTERSECTION)


solid = part.part
